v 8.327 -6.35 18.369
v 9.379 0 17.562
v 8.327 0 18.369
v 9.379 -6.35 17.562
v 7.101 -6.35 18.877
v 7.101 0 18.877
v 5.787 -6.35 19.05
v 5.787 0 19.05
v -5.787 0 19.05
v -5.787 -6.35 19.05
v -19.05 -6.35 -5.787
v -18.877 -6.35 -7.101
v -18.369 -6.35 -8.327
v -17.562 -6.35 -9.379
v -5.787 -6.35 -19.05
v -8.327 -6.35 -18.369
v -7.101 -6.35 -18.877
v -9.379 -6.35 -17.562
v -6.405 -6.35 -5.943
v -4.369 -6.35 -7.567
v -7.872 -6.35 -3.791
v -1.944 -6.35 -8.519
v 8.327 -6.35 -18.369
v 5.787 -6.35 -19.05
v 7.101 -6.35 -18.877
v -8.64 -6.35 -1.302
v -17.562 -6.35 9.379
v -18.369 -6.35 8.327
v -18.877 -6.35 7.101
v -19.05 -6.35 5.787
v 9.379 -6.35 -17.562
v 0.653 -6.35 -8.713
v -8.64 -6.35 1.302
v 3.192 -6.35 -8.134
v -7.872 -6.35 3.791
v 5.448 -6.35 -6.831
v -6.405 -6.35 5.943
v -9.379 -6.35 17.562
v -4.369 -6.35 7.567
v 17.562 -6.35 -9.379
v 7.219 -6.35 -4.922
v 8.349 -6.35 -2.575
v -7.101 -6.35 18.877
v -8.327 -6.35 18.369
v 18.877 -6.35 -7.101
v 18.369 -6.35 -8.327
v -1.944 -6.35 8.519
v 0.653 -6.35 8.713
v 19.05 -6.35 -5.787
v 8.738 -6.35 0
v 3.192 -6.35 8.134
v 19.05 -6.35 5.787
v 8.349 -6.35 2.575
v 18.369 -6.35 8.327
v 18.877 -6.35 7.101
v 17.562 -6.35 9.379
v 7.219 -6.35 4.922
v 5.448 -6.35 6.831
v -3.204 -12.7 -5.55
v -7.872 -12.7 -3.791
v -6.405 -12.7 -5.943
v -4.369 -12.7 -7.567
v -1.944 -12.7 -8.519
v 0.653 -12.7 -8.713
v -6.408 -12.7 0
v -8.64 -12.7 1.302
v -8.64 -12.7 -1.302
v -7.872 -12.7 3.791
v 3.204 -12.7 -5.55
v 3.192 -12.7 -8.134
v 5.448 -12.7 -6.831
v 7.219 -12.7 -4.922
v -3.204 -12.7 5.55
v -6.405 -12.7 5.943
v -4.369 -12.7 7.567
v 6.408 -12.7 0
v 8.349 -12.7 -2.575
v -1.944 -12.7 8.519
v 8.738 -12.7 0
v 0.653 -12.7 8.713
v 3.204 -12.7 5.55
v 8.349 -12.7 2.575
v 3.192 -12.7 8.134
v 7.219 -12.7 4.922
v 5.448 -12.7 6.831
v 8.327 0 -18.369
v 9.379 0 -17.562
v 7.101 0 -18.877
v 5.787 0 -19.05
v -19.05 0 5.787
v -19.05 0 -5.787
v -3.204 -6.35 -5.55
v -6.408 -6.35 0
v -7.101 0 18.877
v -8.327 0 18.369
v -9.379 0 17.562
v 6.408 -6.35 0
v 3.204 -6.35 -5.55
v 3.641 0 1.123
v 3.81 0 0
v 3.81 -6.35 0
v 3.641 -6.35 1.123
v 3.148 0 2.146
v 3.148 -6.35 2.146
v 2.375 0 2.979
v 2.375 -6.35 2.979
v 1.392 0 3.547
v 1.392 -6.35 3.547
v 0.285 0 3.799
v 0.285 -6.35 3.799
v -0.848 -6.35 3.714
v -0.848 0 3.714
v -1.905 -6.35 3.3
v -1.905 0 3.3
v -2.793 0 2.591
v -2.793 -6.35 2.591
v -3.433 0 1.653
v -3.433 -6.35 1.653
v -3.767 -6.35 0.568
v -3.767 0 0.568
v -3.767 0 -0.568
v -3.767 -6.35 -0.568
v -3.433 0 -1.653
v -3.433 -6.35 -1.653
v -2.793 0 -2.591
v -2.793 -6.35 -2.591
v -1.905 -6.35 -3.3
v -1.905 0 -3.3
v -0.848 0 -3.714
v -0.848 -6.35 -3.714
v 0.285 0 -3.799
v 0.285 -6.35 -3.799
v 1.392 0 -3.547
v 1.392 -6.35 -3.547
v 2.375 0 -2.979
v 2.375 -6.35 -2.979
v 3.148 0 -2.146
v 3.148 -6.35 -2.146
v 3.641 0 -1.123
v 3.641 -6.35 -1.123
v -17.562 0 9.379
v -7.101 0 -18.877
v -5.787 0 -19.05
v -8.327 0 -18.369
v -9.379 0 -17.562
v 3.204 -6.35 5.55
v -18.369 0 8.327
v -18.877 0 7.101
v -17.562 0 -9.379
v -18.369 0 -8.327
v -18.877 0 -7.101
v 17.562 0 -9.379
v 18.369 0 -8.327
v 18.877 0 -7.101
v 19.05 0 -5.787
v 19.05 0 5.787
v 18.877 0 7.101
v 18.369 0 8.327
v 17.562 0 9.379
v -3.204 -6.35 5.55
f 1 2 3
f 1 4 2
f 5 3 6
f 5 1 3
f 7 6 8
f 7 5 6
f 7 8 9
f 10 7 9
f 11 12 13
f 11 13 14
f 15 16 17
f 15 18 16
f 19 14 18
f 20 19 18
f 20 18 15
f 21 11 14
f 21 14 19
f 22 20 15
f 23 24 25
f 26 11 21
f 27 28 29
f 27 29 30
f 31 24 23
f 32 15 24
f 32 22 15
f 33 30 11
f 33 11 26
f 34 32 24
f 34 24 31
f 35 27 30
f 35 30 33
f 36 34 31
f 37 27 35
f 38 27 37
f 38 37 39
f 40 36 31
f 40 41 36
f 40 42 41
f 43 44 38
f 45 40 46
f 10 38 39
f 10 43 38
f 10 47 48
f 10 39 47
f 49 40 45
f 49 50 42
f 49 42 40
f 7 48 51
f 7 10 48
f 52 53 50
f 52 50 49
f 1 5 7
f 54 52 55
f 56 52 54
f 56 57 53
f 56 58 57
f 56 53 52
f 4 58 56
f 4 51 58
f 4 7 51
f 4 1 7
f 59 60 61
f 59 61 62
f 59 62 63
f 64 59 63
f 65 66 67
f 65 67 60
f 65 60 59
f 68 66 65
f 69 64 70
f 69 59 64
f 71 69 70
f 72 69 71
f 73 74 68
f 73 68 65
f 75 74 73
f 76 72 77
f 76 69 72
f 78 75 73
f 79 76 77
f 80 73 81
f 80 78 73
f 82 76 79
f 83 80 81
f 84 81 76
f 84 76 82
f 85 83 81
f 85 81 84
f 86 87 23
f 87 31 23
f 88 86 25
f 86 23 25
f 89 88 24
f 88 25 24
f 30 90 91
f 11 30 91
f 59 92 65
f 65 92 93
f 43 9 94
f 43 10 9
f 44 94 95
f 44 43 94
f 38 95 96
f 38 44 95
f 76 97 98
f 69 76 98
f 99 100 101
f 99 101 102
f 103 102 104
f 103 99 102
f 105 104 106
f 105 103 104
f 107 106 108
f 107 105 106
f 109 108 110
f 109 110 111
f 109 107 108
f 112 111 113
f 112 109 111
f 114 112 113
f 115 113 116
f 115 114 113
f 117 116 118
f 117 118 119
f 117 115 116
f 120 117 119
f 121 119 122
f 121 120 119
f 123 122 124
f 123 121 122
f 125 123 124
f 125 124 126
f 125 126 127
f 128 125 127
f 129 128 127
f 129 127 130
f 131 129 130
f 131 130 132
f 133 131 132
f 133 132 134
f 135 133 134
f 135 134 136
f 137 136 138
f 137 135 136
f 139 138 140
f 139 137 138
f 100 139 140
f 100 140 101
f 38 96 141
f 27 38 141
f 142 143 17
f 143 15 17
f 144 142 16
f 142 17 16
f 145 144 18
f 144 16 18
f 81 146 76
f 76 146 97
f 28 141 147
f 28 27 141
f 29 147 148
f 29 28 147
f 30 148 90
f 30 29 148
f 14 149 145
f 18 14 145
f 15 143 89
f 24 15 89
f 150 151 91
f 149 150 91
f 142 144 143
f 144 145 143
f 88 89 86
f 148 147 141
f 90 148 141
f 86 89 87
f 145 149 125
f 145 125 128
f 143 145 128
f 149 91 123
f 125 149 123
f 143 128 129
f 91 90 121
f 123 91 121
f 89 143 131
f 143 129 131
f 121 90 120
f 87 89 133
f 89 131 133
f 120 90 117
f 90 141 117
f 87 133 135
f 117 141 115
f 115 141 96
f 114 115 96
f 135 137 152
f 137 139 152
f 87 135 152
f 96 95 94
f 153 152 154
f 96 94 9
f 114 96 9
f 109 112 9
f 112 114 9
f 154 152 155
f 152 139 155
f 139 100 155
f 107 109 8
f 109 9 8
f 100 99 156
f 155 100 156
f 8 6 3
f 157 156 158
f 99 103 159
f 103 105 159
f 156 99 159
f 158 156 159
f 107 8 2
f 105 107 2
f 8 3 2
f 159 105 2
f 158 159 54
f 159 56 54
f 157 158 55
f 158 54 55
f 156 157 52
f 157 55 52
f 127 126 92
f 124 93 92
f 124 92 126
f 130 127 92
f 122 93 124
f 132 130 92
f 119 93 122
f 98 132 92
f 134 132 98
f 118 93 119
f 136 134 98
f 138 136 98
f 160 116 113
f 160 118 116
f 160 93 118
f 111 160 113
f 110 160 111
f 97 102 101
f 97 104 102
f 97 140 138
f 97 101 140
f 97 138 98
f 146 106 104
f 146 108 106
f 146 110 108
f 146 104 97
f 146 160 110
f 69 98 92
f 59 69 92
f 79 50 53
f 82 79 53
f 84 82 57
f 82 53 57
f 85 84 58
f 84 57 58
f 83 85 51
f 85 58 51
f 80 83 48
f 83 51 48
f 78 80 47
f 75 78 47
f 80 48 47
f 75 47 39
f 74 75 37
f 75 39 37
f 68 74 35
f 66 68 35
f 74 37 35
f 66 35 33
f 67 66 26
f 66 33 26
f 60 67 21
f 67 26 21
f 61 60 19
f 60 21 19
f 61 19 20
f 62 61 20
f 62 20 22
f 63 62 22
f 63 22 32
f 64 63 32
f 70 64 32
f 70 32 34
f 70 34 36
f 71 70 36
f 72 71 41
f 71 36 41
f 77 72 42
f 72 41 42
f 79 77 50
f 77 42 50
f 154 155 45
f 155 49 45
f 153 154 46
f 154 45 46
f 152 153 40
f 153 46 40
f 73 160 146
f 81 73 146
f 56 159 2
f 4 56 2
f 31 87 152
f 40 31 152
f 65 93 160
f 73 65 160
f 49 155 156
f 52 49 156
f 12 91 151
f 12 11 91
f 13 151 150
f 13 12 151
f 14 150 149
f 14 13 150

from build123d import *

# Parameters (mm, degrees)
F0_R     = 3.81
F1_DEPTH = 6.35
F2_R     = 8.7376
F3_DEPTH = 6.35
F4_R     = 5.08


with BuildPart() as f1:
    # F0 (on Front) → F1 (new body)
    with BuildSketch(Plane.XZ):
        Polygon((19.05, 7.890768), (7.890768, 19.05), (-7.890768, 19.05), (-19.05, 7.890768), (-19.05, -7.890768), (-7.890768, -19.05), (7.890768, -19.05), (19.05, -7.890768), align=None)
        Circle(F0_R, mode=Mode.SUBTRACT)
    extrude(amount=F1_DEPTH)

    # F2 (on face) → F3 (join)
    with BuildSketch(Plane.XZ.offset(6.35)):
        Circle(F2_R)
        Polygon((-3.204236, -5.5499), (-6.408473, 0), (-3.204236, 5.5499), (3.204236, 5.5499), (6.408473, 0), (3.204236, -5.5499), align=None, mode=Mode.SUBTRACT)
    extrude(amount=F3_DEPTH)

    # F4
    f4_edges = [f1.edges().sort_by_distance(p)[0] for p in [
        (7.890768, -3.175, 19.05),
        (19.05, -3.175, 7.890768),
        (19.05, -3.175, -7.890768),
        (7.890768, -3.175, -19.05),
        (-7.890768, -3.175, -19.05),
        (-19.05, -3.175, -7.890768),
        (-19.05, -3.175, 7.890768),
        (-7.890768, -3.175, 19.05),
    ]]
    fillet(f4_edges, radius=F4_R)


solid = f1.part
